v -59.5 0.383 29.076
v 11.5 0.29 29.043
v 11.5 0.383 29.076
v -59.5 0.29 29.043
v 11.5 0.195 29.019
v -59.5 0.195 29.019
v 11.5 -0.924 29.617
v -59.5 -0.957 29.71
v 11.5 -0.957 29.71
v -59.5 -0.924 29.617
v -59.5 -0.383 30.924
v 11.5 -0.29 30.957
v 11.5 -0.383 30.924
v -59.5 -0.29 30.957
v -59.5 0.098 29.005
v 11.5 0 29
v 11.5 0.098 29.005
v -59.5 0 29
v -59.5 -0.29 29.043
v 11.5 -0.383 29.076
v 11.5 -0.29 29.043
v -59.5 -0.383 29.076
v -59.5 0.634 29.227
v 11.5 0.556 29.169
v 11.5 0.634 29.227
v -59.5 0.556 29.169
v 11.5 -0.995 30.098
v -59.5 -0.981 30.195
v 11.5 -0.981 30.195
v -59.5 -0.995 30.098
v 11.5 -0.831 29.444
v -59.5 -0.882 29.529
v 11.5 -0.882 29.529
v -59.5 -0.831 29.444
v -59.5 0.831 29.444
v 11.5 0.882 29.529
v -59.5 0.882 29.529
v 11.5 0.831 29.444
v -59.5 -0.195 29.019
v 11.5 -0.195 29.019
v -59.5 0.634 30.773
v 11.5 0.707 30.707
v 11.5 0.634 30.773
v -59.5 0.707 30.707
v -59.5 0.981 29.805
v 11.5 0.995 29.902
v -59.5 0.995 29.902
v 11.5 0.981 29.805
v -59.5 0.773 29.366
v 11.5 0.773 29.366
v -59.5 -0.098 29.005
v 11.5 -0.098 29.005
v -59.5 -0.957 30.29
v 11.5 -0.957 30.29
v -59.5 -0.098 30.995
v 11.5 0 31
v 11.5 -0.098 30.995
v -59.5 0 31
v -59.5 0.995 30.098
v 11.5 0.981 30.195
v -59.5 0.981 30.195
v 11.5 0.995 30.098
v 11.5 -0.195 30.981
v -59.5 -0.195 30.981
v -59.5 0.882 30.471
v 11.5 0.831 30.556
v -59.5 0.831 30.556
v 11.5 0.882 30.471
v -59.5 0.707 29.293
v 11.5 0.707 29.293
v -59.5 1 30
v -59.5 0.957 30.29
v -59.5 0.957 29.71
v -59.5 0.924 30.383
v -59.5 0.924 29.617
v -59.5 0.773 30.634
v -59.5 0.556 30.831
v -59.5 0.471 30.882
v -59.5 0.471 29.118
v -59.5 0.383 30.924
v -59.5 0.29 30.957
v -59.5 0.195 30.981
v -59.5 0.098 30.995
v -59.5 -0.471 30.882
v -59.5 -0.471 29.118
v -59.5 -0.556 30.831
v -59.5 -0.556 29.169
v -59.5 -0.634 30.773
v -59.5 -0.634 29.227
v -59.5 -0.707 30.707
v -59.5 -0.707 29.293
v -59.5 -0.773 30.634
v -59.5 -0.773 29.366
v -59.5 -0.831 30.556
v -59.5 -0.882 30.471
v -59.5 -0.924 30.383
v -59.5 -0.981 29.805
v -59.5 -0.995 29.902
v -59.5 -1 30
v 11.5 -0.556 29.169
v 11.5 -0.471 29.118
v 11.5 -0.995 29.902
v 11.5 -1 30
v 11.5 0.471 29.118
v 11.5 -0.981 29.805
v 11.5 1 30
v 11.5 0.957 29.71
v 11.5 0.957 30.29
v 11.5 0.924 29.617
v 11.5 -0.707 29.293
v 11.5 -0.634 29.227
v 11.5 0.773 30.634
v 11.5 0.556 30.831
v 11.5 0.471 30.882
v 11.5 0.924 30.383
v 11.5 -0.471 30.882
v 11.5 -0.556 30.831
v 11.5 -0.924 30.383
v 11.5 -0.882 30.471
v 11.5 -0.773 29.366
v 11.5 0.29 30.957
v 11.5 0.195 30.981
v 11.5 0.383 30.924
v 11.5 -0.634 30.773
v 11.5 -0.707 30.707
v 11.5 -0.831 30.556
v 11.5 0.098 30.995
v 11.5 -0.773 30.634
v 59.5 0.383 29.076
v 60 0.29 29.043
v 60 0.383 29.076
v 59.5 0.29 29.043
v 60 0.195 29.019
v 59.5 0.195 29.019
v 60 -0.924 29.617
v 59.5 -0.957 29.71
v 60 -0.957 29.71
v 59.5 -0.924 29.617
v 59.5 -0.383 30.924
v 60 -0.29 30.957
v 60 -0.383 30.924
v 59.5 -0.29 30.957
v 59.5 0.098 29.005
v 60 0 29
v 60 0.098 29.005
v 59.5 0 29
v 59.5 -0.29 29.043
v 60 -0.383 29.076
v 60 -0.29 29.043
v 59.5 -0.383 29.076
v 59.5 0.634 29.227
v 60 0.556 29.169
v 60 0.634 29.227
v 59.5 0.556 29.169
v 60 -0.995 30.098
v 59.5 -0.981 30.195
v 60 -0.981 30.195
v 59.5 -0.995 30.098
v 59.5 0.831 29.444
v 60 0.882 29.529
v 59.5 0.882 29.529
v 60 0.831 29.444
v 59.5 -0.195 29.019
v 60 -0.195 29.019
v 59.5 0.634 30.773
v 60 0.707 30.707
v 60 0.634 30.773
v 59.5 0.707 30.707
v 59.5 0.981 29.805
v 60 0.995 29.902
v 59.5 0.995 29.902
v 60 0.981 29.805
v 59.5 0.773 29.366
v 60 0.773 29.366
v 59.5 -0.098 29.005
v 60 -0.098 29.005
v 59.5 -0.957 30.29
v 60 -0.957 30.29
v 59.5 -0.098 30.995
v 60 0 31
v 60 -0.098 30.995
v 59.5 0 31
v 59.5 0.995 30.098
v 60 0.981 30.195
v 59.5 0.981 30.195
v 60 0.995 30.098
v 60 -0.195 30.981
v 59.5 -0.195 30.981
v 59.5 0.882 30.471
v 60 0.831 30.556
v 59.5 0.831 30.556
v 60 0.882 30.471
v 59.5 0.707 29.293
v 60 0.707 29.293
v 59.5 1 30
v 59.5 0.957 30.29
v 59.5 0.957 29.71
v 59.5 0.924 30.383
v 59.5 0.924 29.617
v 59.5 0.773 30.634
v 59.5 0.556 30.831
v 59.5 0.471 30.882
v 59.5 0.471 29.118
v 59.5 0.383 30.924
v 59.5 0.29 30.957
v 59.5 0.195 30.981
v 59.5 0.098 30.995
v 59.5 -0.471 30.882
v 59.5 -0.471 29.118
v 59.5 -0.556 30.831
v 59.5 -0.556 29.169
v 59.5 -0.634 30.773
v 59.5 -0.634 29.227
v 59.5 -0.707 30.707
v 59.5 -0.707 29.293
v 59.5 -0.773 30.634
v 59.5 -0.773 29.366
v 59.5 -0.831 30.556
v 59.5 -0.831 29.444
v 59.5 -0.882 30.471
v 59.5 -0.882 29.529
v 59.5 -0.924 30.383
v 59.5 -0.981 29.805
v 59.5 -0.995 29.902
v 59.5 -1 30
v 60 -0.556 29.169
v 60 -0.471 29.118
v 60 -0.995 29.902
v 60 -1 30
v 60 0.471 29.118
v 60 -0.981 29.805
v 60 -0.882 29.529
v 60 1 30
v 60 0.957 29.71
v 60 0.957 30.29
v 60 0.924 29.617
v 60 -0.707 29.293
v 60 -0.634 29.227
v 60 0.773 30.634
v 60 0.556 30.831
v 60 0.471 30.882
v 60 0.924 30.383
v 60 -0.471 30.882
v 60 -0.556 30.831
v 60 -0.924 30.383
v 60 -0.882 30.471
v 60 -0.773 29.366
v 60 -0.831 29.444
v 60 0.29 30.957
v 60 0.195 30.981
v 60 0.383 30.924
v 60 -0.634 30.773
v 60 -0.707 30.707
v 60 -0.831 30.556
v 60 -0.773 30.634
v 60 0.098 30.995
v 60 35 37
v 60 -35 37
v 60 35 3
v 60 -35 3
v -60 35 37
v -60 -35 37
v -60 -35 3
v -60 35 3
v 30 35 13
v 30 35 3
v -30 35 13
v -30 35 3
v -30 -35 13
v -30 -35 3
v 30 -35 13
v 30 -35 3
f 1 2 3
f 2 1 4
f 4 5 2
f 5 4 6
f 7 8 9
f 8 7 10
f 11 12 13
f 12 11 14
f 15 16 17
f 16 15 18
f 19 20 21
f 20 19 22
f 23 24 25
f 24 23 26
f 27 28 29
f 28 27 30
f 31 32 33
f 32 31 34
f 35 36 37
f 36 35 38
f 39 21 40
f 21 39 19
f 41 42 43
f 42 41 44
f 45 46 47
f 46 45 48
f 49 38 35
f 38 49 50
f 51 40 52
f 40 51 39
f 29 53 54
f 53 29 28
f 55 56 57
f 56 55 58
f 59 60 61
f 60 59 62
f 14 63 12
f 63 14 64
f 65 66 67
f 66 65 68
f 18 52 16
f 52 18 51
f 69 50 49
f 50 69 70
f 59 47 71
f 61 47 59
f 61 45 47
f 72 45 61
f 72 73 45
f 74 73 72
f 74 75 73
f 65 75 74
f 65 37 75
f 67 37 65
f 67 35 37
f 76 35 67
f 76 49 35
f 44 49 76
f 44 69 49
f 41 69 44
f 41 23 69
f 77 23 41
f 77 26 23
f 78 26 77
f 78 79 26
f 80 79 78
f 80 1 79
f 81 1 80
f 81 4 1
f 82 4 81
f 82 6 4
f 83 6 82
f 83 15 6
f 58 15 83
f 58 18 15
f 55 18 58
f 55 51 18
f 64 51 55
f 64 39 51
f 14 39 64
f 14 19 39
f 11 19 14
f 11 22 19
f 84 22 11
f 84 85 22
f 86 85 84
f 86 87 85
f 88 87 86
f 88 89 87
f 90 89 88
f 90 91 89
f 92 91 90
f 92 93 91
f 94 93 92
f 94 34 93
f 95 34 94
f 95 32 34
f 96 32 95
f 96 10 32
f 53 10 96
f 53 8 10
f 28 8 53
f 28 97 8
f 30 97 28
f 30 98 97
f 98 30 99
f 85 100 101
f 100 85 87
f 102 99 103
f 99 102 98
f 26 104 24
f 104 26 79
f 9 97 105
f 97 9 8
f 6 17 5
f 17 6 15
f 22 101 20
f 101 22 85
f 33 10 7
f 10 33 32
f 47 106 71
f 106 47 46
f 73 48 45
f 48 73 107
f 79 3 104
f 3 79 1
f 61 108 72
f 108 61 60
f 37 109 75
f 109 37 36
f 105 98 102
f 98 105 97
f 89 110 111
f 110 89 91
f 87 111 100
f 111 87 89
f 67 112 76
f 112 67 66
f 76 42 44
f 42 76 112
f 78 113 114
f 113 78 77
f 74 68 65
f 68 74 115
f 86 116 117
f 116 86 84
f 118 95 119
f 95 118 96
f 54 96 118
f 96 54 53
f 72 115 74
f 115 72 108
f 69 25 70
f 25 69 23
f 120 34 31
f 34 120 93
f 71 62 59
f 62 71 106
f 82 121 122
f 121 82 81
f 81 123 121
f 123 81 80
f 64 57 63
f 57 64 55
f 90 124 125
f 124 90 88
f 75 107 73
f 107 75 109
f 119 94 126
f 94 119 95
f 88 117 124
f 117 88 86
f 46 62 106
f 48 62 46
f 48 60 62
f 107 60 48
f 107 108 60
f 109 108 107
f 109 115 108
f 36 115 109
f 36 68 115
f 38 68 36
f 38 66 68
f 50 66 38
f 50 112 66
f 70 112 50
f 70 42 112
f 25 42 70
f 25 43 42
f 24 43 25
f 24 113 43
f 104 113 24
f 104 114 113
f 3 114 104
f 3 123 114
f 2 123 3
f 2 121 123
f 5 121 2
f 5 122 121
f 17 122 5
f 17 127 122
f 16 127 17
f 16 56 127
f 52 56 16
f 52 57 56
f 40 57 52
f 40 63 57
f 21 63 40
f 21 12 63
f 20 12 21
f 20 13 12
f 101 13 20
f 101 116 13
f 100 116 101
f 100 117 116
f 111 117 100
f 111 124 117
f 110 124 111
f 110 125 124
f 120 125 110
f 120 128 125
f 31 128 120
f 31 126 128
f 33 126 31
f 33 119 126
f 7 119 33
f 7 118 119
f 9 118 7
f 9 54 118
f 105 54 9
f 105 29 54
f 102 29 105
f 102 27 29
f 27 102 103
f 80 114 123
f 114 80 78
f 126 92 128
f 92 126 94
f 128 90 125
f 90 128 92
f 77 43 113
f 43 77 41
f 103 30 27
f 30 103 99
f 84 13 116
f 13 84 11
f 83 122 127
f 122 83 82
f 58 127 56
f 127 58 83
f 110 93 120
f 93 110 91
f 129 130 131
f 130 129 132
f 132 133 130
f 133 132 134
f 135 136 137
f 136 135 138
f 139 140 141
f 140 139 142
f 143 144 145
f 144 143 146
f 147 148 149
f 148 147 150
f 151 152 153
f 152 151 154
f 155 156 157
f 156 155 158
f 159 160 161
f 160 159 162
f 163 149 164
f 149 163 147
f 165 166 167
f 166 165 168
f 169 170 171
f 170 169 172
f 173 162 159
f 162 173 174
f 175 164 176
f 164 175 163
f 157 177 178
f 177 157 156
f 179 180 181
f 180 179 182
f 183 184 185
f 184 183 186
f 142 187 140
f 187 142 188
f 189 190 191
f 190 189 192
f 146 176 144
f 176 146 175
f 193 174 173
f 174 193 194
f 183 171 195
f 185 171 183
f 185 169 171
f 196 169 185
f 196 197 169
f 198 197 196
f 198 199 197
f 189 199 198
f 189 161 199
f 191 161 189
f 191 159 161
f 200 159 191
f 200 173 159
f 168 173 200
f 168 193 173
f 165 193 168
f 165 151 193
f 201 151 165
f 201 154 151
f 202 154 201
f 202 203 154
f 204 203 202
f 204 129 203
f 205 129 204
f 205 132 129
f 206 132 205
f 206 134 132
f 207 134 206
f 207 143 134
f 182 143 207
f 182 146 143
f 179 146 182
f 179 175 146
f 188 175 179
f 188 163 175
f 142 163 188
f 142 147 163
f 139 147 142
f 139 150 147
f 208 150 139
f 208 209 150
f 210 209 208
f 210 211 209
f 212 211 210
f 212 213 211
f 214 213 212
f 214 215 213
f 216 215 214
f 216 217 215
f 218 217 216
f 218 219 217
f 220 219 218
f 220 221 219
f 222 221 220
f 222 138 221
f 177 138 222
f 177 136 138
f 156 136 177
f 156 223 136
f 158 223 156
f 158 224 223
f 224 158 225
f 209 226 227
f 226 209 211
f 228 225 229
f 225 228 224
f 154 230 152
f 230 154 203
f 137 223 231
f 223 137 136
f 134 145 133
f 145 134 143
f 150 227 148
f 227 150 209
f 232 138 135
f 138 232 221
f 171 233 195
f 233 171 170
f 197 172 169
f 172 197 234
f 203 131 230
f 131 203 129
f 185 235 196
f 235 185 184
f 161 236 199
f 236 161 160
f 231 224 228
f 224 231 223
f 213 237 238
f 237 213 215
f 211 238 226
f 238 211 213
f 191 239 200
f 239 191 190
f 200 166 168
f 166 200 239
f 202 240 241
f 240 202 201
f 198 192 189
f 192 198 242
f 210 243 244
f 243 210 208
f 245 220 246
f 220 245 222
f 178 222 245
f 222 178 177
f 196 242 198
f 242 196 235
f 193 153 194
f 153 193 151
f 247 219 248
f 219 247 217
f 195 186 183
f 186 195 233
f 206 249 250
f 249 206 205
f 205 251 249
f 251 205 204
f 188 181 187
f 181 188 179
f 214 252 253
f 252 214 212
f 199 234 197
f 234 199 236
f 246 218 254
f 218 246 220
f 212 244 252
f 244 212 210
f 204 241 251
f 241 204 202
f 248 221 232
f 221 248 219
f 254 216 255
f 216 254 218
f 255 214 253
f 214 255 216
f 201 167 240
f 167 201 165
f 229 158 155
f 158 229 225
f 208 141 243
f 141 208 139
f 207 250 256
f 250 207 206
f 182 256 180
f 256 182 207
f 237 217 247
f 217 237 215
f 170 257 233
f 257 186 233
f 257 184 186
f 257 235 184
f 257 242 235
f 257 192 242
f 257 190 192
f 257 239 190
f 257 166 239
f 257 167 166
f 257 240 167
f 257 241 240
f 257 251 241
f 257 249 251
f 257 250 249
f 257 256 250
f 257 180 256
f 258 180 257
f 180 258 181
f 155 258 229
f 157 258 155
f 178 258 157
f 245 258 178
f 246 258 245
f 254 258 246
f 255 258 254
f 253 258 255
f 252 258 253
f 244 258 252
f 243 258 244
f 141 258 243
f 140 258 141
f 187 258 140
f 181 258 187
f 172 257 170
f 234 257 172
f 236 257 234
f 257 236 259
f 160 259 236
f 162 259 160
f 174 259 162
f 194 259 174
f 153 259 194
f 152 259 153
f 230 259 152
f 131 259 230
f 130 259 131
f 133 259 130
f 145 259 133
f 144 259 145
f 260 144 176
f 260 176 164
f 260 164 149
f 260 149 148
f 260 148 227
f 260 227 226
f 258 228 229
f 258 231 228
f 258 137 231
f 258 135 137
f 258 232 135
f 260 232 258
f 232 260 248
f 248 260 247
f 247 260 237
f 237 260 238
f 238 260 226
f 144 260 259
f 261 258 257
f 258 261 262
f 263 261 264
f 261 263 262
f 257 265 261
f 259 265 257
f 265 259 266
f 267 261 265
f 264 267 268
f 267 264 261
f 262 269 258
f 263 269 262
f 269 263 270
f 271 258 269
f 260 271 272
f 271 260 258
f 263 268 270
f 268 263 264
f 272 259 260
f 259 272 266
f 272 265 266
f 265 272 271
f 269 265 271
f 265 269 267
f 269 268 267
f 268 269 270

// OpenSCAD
// Mini horizontal gel-electrophoresis buffer tank
// Print orientation: tank rests on XY plane, builds up in +Z

$fn = 64;

// ---- Tank dimensions ----
tank_x      = 120;   // outer length (X)
tank_y      = 70;    // outer width (Y)
tank_h      = 40;    // outer height (Z)
wall        = 3;     // wall thickness
floor       = 3;     // floor thickness

// ---- Platform dimensions ----
plat_x      = 60;    // platform length in X
plat_top_z  = 13;    // platform top height above outer base (z = floor + 10)

// ---- Electrode holes ----
hole_d      = 2;     // horizontal hole diameter
hole_y      = 0;     // hole Y position
hole_z      = 30;    // hole Z position

// ---- Cutting overshoot ----
eps         = 0.5;   // extension past cut faces

difference() {
    // Tank body
    translate([-tank_x/2, -tank_y/2, 0])
        cube([tank_x, tank_y, tank_h - floor]);

    // Floor
    translate([-tank_x/2, -tank_y/2, 0])
        cube([tank_x, tank_y, floor]);

    // Raised platform (spans full inner width, centred in X)
    translate([-plat_x/2, -tank_y/2 - eps, floor])
        cube([plat_x, tank_y + 2*eps, plat_top_z - floor]);

    // Horizontal electrode holes through each end wall
    for (sx = [-1, 1])
        translate([sx * (tank_x/2 - eps), hole_y, hole_z])
            rotate([0, 90, 0])
                cylinder(d = hole_d, h = tank_y + 2*eps);
}
